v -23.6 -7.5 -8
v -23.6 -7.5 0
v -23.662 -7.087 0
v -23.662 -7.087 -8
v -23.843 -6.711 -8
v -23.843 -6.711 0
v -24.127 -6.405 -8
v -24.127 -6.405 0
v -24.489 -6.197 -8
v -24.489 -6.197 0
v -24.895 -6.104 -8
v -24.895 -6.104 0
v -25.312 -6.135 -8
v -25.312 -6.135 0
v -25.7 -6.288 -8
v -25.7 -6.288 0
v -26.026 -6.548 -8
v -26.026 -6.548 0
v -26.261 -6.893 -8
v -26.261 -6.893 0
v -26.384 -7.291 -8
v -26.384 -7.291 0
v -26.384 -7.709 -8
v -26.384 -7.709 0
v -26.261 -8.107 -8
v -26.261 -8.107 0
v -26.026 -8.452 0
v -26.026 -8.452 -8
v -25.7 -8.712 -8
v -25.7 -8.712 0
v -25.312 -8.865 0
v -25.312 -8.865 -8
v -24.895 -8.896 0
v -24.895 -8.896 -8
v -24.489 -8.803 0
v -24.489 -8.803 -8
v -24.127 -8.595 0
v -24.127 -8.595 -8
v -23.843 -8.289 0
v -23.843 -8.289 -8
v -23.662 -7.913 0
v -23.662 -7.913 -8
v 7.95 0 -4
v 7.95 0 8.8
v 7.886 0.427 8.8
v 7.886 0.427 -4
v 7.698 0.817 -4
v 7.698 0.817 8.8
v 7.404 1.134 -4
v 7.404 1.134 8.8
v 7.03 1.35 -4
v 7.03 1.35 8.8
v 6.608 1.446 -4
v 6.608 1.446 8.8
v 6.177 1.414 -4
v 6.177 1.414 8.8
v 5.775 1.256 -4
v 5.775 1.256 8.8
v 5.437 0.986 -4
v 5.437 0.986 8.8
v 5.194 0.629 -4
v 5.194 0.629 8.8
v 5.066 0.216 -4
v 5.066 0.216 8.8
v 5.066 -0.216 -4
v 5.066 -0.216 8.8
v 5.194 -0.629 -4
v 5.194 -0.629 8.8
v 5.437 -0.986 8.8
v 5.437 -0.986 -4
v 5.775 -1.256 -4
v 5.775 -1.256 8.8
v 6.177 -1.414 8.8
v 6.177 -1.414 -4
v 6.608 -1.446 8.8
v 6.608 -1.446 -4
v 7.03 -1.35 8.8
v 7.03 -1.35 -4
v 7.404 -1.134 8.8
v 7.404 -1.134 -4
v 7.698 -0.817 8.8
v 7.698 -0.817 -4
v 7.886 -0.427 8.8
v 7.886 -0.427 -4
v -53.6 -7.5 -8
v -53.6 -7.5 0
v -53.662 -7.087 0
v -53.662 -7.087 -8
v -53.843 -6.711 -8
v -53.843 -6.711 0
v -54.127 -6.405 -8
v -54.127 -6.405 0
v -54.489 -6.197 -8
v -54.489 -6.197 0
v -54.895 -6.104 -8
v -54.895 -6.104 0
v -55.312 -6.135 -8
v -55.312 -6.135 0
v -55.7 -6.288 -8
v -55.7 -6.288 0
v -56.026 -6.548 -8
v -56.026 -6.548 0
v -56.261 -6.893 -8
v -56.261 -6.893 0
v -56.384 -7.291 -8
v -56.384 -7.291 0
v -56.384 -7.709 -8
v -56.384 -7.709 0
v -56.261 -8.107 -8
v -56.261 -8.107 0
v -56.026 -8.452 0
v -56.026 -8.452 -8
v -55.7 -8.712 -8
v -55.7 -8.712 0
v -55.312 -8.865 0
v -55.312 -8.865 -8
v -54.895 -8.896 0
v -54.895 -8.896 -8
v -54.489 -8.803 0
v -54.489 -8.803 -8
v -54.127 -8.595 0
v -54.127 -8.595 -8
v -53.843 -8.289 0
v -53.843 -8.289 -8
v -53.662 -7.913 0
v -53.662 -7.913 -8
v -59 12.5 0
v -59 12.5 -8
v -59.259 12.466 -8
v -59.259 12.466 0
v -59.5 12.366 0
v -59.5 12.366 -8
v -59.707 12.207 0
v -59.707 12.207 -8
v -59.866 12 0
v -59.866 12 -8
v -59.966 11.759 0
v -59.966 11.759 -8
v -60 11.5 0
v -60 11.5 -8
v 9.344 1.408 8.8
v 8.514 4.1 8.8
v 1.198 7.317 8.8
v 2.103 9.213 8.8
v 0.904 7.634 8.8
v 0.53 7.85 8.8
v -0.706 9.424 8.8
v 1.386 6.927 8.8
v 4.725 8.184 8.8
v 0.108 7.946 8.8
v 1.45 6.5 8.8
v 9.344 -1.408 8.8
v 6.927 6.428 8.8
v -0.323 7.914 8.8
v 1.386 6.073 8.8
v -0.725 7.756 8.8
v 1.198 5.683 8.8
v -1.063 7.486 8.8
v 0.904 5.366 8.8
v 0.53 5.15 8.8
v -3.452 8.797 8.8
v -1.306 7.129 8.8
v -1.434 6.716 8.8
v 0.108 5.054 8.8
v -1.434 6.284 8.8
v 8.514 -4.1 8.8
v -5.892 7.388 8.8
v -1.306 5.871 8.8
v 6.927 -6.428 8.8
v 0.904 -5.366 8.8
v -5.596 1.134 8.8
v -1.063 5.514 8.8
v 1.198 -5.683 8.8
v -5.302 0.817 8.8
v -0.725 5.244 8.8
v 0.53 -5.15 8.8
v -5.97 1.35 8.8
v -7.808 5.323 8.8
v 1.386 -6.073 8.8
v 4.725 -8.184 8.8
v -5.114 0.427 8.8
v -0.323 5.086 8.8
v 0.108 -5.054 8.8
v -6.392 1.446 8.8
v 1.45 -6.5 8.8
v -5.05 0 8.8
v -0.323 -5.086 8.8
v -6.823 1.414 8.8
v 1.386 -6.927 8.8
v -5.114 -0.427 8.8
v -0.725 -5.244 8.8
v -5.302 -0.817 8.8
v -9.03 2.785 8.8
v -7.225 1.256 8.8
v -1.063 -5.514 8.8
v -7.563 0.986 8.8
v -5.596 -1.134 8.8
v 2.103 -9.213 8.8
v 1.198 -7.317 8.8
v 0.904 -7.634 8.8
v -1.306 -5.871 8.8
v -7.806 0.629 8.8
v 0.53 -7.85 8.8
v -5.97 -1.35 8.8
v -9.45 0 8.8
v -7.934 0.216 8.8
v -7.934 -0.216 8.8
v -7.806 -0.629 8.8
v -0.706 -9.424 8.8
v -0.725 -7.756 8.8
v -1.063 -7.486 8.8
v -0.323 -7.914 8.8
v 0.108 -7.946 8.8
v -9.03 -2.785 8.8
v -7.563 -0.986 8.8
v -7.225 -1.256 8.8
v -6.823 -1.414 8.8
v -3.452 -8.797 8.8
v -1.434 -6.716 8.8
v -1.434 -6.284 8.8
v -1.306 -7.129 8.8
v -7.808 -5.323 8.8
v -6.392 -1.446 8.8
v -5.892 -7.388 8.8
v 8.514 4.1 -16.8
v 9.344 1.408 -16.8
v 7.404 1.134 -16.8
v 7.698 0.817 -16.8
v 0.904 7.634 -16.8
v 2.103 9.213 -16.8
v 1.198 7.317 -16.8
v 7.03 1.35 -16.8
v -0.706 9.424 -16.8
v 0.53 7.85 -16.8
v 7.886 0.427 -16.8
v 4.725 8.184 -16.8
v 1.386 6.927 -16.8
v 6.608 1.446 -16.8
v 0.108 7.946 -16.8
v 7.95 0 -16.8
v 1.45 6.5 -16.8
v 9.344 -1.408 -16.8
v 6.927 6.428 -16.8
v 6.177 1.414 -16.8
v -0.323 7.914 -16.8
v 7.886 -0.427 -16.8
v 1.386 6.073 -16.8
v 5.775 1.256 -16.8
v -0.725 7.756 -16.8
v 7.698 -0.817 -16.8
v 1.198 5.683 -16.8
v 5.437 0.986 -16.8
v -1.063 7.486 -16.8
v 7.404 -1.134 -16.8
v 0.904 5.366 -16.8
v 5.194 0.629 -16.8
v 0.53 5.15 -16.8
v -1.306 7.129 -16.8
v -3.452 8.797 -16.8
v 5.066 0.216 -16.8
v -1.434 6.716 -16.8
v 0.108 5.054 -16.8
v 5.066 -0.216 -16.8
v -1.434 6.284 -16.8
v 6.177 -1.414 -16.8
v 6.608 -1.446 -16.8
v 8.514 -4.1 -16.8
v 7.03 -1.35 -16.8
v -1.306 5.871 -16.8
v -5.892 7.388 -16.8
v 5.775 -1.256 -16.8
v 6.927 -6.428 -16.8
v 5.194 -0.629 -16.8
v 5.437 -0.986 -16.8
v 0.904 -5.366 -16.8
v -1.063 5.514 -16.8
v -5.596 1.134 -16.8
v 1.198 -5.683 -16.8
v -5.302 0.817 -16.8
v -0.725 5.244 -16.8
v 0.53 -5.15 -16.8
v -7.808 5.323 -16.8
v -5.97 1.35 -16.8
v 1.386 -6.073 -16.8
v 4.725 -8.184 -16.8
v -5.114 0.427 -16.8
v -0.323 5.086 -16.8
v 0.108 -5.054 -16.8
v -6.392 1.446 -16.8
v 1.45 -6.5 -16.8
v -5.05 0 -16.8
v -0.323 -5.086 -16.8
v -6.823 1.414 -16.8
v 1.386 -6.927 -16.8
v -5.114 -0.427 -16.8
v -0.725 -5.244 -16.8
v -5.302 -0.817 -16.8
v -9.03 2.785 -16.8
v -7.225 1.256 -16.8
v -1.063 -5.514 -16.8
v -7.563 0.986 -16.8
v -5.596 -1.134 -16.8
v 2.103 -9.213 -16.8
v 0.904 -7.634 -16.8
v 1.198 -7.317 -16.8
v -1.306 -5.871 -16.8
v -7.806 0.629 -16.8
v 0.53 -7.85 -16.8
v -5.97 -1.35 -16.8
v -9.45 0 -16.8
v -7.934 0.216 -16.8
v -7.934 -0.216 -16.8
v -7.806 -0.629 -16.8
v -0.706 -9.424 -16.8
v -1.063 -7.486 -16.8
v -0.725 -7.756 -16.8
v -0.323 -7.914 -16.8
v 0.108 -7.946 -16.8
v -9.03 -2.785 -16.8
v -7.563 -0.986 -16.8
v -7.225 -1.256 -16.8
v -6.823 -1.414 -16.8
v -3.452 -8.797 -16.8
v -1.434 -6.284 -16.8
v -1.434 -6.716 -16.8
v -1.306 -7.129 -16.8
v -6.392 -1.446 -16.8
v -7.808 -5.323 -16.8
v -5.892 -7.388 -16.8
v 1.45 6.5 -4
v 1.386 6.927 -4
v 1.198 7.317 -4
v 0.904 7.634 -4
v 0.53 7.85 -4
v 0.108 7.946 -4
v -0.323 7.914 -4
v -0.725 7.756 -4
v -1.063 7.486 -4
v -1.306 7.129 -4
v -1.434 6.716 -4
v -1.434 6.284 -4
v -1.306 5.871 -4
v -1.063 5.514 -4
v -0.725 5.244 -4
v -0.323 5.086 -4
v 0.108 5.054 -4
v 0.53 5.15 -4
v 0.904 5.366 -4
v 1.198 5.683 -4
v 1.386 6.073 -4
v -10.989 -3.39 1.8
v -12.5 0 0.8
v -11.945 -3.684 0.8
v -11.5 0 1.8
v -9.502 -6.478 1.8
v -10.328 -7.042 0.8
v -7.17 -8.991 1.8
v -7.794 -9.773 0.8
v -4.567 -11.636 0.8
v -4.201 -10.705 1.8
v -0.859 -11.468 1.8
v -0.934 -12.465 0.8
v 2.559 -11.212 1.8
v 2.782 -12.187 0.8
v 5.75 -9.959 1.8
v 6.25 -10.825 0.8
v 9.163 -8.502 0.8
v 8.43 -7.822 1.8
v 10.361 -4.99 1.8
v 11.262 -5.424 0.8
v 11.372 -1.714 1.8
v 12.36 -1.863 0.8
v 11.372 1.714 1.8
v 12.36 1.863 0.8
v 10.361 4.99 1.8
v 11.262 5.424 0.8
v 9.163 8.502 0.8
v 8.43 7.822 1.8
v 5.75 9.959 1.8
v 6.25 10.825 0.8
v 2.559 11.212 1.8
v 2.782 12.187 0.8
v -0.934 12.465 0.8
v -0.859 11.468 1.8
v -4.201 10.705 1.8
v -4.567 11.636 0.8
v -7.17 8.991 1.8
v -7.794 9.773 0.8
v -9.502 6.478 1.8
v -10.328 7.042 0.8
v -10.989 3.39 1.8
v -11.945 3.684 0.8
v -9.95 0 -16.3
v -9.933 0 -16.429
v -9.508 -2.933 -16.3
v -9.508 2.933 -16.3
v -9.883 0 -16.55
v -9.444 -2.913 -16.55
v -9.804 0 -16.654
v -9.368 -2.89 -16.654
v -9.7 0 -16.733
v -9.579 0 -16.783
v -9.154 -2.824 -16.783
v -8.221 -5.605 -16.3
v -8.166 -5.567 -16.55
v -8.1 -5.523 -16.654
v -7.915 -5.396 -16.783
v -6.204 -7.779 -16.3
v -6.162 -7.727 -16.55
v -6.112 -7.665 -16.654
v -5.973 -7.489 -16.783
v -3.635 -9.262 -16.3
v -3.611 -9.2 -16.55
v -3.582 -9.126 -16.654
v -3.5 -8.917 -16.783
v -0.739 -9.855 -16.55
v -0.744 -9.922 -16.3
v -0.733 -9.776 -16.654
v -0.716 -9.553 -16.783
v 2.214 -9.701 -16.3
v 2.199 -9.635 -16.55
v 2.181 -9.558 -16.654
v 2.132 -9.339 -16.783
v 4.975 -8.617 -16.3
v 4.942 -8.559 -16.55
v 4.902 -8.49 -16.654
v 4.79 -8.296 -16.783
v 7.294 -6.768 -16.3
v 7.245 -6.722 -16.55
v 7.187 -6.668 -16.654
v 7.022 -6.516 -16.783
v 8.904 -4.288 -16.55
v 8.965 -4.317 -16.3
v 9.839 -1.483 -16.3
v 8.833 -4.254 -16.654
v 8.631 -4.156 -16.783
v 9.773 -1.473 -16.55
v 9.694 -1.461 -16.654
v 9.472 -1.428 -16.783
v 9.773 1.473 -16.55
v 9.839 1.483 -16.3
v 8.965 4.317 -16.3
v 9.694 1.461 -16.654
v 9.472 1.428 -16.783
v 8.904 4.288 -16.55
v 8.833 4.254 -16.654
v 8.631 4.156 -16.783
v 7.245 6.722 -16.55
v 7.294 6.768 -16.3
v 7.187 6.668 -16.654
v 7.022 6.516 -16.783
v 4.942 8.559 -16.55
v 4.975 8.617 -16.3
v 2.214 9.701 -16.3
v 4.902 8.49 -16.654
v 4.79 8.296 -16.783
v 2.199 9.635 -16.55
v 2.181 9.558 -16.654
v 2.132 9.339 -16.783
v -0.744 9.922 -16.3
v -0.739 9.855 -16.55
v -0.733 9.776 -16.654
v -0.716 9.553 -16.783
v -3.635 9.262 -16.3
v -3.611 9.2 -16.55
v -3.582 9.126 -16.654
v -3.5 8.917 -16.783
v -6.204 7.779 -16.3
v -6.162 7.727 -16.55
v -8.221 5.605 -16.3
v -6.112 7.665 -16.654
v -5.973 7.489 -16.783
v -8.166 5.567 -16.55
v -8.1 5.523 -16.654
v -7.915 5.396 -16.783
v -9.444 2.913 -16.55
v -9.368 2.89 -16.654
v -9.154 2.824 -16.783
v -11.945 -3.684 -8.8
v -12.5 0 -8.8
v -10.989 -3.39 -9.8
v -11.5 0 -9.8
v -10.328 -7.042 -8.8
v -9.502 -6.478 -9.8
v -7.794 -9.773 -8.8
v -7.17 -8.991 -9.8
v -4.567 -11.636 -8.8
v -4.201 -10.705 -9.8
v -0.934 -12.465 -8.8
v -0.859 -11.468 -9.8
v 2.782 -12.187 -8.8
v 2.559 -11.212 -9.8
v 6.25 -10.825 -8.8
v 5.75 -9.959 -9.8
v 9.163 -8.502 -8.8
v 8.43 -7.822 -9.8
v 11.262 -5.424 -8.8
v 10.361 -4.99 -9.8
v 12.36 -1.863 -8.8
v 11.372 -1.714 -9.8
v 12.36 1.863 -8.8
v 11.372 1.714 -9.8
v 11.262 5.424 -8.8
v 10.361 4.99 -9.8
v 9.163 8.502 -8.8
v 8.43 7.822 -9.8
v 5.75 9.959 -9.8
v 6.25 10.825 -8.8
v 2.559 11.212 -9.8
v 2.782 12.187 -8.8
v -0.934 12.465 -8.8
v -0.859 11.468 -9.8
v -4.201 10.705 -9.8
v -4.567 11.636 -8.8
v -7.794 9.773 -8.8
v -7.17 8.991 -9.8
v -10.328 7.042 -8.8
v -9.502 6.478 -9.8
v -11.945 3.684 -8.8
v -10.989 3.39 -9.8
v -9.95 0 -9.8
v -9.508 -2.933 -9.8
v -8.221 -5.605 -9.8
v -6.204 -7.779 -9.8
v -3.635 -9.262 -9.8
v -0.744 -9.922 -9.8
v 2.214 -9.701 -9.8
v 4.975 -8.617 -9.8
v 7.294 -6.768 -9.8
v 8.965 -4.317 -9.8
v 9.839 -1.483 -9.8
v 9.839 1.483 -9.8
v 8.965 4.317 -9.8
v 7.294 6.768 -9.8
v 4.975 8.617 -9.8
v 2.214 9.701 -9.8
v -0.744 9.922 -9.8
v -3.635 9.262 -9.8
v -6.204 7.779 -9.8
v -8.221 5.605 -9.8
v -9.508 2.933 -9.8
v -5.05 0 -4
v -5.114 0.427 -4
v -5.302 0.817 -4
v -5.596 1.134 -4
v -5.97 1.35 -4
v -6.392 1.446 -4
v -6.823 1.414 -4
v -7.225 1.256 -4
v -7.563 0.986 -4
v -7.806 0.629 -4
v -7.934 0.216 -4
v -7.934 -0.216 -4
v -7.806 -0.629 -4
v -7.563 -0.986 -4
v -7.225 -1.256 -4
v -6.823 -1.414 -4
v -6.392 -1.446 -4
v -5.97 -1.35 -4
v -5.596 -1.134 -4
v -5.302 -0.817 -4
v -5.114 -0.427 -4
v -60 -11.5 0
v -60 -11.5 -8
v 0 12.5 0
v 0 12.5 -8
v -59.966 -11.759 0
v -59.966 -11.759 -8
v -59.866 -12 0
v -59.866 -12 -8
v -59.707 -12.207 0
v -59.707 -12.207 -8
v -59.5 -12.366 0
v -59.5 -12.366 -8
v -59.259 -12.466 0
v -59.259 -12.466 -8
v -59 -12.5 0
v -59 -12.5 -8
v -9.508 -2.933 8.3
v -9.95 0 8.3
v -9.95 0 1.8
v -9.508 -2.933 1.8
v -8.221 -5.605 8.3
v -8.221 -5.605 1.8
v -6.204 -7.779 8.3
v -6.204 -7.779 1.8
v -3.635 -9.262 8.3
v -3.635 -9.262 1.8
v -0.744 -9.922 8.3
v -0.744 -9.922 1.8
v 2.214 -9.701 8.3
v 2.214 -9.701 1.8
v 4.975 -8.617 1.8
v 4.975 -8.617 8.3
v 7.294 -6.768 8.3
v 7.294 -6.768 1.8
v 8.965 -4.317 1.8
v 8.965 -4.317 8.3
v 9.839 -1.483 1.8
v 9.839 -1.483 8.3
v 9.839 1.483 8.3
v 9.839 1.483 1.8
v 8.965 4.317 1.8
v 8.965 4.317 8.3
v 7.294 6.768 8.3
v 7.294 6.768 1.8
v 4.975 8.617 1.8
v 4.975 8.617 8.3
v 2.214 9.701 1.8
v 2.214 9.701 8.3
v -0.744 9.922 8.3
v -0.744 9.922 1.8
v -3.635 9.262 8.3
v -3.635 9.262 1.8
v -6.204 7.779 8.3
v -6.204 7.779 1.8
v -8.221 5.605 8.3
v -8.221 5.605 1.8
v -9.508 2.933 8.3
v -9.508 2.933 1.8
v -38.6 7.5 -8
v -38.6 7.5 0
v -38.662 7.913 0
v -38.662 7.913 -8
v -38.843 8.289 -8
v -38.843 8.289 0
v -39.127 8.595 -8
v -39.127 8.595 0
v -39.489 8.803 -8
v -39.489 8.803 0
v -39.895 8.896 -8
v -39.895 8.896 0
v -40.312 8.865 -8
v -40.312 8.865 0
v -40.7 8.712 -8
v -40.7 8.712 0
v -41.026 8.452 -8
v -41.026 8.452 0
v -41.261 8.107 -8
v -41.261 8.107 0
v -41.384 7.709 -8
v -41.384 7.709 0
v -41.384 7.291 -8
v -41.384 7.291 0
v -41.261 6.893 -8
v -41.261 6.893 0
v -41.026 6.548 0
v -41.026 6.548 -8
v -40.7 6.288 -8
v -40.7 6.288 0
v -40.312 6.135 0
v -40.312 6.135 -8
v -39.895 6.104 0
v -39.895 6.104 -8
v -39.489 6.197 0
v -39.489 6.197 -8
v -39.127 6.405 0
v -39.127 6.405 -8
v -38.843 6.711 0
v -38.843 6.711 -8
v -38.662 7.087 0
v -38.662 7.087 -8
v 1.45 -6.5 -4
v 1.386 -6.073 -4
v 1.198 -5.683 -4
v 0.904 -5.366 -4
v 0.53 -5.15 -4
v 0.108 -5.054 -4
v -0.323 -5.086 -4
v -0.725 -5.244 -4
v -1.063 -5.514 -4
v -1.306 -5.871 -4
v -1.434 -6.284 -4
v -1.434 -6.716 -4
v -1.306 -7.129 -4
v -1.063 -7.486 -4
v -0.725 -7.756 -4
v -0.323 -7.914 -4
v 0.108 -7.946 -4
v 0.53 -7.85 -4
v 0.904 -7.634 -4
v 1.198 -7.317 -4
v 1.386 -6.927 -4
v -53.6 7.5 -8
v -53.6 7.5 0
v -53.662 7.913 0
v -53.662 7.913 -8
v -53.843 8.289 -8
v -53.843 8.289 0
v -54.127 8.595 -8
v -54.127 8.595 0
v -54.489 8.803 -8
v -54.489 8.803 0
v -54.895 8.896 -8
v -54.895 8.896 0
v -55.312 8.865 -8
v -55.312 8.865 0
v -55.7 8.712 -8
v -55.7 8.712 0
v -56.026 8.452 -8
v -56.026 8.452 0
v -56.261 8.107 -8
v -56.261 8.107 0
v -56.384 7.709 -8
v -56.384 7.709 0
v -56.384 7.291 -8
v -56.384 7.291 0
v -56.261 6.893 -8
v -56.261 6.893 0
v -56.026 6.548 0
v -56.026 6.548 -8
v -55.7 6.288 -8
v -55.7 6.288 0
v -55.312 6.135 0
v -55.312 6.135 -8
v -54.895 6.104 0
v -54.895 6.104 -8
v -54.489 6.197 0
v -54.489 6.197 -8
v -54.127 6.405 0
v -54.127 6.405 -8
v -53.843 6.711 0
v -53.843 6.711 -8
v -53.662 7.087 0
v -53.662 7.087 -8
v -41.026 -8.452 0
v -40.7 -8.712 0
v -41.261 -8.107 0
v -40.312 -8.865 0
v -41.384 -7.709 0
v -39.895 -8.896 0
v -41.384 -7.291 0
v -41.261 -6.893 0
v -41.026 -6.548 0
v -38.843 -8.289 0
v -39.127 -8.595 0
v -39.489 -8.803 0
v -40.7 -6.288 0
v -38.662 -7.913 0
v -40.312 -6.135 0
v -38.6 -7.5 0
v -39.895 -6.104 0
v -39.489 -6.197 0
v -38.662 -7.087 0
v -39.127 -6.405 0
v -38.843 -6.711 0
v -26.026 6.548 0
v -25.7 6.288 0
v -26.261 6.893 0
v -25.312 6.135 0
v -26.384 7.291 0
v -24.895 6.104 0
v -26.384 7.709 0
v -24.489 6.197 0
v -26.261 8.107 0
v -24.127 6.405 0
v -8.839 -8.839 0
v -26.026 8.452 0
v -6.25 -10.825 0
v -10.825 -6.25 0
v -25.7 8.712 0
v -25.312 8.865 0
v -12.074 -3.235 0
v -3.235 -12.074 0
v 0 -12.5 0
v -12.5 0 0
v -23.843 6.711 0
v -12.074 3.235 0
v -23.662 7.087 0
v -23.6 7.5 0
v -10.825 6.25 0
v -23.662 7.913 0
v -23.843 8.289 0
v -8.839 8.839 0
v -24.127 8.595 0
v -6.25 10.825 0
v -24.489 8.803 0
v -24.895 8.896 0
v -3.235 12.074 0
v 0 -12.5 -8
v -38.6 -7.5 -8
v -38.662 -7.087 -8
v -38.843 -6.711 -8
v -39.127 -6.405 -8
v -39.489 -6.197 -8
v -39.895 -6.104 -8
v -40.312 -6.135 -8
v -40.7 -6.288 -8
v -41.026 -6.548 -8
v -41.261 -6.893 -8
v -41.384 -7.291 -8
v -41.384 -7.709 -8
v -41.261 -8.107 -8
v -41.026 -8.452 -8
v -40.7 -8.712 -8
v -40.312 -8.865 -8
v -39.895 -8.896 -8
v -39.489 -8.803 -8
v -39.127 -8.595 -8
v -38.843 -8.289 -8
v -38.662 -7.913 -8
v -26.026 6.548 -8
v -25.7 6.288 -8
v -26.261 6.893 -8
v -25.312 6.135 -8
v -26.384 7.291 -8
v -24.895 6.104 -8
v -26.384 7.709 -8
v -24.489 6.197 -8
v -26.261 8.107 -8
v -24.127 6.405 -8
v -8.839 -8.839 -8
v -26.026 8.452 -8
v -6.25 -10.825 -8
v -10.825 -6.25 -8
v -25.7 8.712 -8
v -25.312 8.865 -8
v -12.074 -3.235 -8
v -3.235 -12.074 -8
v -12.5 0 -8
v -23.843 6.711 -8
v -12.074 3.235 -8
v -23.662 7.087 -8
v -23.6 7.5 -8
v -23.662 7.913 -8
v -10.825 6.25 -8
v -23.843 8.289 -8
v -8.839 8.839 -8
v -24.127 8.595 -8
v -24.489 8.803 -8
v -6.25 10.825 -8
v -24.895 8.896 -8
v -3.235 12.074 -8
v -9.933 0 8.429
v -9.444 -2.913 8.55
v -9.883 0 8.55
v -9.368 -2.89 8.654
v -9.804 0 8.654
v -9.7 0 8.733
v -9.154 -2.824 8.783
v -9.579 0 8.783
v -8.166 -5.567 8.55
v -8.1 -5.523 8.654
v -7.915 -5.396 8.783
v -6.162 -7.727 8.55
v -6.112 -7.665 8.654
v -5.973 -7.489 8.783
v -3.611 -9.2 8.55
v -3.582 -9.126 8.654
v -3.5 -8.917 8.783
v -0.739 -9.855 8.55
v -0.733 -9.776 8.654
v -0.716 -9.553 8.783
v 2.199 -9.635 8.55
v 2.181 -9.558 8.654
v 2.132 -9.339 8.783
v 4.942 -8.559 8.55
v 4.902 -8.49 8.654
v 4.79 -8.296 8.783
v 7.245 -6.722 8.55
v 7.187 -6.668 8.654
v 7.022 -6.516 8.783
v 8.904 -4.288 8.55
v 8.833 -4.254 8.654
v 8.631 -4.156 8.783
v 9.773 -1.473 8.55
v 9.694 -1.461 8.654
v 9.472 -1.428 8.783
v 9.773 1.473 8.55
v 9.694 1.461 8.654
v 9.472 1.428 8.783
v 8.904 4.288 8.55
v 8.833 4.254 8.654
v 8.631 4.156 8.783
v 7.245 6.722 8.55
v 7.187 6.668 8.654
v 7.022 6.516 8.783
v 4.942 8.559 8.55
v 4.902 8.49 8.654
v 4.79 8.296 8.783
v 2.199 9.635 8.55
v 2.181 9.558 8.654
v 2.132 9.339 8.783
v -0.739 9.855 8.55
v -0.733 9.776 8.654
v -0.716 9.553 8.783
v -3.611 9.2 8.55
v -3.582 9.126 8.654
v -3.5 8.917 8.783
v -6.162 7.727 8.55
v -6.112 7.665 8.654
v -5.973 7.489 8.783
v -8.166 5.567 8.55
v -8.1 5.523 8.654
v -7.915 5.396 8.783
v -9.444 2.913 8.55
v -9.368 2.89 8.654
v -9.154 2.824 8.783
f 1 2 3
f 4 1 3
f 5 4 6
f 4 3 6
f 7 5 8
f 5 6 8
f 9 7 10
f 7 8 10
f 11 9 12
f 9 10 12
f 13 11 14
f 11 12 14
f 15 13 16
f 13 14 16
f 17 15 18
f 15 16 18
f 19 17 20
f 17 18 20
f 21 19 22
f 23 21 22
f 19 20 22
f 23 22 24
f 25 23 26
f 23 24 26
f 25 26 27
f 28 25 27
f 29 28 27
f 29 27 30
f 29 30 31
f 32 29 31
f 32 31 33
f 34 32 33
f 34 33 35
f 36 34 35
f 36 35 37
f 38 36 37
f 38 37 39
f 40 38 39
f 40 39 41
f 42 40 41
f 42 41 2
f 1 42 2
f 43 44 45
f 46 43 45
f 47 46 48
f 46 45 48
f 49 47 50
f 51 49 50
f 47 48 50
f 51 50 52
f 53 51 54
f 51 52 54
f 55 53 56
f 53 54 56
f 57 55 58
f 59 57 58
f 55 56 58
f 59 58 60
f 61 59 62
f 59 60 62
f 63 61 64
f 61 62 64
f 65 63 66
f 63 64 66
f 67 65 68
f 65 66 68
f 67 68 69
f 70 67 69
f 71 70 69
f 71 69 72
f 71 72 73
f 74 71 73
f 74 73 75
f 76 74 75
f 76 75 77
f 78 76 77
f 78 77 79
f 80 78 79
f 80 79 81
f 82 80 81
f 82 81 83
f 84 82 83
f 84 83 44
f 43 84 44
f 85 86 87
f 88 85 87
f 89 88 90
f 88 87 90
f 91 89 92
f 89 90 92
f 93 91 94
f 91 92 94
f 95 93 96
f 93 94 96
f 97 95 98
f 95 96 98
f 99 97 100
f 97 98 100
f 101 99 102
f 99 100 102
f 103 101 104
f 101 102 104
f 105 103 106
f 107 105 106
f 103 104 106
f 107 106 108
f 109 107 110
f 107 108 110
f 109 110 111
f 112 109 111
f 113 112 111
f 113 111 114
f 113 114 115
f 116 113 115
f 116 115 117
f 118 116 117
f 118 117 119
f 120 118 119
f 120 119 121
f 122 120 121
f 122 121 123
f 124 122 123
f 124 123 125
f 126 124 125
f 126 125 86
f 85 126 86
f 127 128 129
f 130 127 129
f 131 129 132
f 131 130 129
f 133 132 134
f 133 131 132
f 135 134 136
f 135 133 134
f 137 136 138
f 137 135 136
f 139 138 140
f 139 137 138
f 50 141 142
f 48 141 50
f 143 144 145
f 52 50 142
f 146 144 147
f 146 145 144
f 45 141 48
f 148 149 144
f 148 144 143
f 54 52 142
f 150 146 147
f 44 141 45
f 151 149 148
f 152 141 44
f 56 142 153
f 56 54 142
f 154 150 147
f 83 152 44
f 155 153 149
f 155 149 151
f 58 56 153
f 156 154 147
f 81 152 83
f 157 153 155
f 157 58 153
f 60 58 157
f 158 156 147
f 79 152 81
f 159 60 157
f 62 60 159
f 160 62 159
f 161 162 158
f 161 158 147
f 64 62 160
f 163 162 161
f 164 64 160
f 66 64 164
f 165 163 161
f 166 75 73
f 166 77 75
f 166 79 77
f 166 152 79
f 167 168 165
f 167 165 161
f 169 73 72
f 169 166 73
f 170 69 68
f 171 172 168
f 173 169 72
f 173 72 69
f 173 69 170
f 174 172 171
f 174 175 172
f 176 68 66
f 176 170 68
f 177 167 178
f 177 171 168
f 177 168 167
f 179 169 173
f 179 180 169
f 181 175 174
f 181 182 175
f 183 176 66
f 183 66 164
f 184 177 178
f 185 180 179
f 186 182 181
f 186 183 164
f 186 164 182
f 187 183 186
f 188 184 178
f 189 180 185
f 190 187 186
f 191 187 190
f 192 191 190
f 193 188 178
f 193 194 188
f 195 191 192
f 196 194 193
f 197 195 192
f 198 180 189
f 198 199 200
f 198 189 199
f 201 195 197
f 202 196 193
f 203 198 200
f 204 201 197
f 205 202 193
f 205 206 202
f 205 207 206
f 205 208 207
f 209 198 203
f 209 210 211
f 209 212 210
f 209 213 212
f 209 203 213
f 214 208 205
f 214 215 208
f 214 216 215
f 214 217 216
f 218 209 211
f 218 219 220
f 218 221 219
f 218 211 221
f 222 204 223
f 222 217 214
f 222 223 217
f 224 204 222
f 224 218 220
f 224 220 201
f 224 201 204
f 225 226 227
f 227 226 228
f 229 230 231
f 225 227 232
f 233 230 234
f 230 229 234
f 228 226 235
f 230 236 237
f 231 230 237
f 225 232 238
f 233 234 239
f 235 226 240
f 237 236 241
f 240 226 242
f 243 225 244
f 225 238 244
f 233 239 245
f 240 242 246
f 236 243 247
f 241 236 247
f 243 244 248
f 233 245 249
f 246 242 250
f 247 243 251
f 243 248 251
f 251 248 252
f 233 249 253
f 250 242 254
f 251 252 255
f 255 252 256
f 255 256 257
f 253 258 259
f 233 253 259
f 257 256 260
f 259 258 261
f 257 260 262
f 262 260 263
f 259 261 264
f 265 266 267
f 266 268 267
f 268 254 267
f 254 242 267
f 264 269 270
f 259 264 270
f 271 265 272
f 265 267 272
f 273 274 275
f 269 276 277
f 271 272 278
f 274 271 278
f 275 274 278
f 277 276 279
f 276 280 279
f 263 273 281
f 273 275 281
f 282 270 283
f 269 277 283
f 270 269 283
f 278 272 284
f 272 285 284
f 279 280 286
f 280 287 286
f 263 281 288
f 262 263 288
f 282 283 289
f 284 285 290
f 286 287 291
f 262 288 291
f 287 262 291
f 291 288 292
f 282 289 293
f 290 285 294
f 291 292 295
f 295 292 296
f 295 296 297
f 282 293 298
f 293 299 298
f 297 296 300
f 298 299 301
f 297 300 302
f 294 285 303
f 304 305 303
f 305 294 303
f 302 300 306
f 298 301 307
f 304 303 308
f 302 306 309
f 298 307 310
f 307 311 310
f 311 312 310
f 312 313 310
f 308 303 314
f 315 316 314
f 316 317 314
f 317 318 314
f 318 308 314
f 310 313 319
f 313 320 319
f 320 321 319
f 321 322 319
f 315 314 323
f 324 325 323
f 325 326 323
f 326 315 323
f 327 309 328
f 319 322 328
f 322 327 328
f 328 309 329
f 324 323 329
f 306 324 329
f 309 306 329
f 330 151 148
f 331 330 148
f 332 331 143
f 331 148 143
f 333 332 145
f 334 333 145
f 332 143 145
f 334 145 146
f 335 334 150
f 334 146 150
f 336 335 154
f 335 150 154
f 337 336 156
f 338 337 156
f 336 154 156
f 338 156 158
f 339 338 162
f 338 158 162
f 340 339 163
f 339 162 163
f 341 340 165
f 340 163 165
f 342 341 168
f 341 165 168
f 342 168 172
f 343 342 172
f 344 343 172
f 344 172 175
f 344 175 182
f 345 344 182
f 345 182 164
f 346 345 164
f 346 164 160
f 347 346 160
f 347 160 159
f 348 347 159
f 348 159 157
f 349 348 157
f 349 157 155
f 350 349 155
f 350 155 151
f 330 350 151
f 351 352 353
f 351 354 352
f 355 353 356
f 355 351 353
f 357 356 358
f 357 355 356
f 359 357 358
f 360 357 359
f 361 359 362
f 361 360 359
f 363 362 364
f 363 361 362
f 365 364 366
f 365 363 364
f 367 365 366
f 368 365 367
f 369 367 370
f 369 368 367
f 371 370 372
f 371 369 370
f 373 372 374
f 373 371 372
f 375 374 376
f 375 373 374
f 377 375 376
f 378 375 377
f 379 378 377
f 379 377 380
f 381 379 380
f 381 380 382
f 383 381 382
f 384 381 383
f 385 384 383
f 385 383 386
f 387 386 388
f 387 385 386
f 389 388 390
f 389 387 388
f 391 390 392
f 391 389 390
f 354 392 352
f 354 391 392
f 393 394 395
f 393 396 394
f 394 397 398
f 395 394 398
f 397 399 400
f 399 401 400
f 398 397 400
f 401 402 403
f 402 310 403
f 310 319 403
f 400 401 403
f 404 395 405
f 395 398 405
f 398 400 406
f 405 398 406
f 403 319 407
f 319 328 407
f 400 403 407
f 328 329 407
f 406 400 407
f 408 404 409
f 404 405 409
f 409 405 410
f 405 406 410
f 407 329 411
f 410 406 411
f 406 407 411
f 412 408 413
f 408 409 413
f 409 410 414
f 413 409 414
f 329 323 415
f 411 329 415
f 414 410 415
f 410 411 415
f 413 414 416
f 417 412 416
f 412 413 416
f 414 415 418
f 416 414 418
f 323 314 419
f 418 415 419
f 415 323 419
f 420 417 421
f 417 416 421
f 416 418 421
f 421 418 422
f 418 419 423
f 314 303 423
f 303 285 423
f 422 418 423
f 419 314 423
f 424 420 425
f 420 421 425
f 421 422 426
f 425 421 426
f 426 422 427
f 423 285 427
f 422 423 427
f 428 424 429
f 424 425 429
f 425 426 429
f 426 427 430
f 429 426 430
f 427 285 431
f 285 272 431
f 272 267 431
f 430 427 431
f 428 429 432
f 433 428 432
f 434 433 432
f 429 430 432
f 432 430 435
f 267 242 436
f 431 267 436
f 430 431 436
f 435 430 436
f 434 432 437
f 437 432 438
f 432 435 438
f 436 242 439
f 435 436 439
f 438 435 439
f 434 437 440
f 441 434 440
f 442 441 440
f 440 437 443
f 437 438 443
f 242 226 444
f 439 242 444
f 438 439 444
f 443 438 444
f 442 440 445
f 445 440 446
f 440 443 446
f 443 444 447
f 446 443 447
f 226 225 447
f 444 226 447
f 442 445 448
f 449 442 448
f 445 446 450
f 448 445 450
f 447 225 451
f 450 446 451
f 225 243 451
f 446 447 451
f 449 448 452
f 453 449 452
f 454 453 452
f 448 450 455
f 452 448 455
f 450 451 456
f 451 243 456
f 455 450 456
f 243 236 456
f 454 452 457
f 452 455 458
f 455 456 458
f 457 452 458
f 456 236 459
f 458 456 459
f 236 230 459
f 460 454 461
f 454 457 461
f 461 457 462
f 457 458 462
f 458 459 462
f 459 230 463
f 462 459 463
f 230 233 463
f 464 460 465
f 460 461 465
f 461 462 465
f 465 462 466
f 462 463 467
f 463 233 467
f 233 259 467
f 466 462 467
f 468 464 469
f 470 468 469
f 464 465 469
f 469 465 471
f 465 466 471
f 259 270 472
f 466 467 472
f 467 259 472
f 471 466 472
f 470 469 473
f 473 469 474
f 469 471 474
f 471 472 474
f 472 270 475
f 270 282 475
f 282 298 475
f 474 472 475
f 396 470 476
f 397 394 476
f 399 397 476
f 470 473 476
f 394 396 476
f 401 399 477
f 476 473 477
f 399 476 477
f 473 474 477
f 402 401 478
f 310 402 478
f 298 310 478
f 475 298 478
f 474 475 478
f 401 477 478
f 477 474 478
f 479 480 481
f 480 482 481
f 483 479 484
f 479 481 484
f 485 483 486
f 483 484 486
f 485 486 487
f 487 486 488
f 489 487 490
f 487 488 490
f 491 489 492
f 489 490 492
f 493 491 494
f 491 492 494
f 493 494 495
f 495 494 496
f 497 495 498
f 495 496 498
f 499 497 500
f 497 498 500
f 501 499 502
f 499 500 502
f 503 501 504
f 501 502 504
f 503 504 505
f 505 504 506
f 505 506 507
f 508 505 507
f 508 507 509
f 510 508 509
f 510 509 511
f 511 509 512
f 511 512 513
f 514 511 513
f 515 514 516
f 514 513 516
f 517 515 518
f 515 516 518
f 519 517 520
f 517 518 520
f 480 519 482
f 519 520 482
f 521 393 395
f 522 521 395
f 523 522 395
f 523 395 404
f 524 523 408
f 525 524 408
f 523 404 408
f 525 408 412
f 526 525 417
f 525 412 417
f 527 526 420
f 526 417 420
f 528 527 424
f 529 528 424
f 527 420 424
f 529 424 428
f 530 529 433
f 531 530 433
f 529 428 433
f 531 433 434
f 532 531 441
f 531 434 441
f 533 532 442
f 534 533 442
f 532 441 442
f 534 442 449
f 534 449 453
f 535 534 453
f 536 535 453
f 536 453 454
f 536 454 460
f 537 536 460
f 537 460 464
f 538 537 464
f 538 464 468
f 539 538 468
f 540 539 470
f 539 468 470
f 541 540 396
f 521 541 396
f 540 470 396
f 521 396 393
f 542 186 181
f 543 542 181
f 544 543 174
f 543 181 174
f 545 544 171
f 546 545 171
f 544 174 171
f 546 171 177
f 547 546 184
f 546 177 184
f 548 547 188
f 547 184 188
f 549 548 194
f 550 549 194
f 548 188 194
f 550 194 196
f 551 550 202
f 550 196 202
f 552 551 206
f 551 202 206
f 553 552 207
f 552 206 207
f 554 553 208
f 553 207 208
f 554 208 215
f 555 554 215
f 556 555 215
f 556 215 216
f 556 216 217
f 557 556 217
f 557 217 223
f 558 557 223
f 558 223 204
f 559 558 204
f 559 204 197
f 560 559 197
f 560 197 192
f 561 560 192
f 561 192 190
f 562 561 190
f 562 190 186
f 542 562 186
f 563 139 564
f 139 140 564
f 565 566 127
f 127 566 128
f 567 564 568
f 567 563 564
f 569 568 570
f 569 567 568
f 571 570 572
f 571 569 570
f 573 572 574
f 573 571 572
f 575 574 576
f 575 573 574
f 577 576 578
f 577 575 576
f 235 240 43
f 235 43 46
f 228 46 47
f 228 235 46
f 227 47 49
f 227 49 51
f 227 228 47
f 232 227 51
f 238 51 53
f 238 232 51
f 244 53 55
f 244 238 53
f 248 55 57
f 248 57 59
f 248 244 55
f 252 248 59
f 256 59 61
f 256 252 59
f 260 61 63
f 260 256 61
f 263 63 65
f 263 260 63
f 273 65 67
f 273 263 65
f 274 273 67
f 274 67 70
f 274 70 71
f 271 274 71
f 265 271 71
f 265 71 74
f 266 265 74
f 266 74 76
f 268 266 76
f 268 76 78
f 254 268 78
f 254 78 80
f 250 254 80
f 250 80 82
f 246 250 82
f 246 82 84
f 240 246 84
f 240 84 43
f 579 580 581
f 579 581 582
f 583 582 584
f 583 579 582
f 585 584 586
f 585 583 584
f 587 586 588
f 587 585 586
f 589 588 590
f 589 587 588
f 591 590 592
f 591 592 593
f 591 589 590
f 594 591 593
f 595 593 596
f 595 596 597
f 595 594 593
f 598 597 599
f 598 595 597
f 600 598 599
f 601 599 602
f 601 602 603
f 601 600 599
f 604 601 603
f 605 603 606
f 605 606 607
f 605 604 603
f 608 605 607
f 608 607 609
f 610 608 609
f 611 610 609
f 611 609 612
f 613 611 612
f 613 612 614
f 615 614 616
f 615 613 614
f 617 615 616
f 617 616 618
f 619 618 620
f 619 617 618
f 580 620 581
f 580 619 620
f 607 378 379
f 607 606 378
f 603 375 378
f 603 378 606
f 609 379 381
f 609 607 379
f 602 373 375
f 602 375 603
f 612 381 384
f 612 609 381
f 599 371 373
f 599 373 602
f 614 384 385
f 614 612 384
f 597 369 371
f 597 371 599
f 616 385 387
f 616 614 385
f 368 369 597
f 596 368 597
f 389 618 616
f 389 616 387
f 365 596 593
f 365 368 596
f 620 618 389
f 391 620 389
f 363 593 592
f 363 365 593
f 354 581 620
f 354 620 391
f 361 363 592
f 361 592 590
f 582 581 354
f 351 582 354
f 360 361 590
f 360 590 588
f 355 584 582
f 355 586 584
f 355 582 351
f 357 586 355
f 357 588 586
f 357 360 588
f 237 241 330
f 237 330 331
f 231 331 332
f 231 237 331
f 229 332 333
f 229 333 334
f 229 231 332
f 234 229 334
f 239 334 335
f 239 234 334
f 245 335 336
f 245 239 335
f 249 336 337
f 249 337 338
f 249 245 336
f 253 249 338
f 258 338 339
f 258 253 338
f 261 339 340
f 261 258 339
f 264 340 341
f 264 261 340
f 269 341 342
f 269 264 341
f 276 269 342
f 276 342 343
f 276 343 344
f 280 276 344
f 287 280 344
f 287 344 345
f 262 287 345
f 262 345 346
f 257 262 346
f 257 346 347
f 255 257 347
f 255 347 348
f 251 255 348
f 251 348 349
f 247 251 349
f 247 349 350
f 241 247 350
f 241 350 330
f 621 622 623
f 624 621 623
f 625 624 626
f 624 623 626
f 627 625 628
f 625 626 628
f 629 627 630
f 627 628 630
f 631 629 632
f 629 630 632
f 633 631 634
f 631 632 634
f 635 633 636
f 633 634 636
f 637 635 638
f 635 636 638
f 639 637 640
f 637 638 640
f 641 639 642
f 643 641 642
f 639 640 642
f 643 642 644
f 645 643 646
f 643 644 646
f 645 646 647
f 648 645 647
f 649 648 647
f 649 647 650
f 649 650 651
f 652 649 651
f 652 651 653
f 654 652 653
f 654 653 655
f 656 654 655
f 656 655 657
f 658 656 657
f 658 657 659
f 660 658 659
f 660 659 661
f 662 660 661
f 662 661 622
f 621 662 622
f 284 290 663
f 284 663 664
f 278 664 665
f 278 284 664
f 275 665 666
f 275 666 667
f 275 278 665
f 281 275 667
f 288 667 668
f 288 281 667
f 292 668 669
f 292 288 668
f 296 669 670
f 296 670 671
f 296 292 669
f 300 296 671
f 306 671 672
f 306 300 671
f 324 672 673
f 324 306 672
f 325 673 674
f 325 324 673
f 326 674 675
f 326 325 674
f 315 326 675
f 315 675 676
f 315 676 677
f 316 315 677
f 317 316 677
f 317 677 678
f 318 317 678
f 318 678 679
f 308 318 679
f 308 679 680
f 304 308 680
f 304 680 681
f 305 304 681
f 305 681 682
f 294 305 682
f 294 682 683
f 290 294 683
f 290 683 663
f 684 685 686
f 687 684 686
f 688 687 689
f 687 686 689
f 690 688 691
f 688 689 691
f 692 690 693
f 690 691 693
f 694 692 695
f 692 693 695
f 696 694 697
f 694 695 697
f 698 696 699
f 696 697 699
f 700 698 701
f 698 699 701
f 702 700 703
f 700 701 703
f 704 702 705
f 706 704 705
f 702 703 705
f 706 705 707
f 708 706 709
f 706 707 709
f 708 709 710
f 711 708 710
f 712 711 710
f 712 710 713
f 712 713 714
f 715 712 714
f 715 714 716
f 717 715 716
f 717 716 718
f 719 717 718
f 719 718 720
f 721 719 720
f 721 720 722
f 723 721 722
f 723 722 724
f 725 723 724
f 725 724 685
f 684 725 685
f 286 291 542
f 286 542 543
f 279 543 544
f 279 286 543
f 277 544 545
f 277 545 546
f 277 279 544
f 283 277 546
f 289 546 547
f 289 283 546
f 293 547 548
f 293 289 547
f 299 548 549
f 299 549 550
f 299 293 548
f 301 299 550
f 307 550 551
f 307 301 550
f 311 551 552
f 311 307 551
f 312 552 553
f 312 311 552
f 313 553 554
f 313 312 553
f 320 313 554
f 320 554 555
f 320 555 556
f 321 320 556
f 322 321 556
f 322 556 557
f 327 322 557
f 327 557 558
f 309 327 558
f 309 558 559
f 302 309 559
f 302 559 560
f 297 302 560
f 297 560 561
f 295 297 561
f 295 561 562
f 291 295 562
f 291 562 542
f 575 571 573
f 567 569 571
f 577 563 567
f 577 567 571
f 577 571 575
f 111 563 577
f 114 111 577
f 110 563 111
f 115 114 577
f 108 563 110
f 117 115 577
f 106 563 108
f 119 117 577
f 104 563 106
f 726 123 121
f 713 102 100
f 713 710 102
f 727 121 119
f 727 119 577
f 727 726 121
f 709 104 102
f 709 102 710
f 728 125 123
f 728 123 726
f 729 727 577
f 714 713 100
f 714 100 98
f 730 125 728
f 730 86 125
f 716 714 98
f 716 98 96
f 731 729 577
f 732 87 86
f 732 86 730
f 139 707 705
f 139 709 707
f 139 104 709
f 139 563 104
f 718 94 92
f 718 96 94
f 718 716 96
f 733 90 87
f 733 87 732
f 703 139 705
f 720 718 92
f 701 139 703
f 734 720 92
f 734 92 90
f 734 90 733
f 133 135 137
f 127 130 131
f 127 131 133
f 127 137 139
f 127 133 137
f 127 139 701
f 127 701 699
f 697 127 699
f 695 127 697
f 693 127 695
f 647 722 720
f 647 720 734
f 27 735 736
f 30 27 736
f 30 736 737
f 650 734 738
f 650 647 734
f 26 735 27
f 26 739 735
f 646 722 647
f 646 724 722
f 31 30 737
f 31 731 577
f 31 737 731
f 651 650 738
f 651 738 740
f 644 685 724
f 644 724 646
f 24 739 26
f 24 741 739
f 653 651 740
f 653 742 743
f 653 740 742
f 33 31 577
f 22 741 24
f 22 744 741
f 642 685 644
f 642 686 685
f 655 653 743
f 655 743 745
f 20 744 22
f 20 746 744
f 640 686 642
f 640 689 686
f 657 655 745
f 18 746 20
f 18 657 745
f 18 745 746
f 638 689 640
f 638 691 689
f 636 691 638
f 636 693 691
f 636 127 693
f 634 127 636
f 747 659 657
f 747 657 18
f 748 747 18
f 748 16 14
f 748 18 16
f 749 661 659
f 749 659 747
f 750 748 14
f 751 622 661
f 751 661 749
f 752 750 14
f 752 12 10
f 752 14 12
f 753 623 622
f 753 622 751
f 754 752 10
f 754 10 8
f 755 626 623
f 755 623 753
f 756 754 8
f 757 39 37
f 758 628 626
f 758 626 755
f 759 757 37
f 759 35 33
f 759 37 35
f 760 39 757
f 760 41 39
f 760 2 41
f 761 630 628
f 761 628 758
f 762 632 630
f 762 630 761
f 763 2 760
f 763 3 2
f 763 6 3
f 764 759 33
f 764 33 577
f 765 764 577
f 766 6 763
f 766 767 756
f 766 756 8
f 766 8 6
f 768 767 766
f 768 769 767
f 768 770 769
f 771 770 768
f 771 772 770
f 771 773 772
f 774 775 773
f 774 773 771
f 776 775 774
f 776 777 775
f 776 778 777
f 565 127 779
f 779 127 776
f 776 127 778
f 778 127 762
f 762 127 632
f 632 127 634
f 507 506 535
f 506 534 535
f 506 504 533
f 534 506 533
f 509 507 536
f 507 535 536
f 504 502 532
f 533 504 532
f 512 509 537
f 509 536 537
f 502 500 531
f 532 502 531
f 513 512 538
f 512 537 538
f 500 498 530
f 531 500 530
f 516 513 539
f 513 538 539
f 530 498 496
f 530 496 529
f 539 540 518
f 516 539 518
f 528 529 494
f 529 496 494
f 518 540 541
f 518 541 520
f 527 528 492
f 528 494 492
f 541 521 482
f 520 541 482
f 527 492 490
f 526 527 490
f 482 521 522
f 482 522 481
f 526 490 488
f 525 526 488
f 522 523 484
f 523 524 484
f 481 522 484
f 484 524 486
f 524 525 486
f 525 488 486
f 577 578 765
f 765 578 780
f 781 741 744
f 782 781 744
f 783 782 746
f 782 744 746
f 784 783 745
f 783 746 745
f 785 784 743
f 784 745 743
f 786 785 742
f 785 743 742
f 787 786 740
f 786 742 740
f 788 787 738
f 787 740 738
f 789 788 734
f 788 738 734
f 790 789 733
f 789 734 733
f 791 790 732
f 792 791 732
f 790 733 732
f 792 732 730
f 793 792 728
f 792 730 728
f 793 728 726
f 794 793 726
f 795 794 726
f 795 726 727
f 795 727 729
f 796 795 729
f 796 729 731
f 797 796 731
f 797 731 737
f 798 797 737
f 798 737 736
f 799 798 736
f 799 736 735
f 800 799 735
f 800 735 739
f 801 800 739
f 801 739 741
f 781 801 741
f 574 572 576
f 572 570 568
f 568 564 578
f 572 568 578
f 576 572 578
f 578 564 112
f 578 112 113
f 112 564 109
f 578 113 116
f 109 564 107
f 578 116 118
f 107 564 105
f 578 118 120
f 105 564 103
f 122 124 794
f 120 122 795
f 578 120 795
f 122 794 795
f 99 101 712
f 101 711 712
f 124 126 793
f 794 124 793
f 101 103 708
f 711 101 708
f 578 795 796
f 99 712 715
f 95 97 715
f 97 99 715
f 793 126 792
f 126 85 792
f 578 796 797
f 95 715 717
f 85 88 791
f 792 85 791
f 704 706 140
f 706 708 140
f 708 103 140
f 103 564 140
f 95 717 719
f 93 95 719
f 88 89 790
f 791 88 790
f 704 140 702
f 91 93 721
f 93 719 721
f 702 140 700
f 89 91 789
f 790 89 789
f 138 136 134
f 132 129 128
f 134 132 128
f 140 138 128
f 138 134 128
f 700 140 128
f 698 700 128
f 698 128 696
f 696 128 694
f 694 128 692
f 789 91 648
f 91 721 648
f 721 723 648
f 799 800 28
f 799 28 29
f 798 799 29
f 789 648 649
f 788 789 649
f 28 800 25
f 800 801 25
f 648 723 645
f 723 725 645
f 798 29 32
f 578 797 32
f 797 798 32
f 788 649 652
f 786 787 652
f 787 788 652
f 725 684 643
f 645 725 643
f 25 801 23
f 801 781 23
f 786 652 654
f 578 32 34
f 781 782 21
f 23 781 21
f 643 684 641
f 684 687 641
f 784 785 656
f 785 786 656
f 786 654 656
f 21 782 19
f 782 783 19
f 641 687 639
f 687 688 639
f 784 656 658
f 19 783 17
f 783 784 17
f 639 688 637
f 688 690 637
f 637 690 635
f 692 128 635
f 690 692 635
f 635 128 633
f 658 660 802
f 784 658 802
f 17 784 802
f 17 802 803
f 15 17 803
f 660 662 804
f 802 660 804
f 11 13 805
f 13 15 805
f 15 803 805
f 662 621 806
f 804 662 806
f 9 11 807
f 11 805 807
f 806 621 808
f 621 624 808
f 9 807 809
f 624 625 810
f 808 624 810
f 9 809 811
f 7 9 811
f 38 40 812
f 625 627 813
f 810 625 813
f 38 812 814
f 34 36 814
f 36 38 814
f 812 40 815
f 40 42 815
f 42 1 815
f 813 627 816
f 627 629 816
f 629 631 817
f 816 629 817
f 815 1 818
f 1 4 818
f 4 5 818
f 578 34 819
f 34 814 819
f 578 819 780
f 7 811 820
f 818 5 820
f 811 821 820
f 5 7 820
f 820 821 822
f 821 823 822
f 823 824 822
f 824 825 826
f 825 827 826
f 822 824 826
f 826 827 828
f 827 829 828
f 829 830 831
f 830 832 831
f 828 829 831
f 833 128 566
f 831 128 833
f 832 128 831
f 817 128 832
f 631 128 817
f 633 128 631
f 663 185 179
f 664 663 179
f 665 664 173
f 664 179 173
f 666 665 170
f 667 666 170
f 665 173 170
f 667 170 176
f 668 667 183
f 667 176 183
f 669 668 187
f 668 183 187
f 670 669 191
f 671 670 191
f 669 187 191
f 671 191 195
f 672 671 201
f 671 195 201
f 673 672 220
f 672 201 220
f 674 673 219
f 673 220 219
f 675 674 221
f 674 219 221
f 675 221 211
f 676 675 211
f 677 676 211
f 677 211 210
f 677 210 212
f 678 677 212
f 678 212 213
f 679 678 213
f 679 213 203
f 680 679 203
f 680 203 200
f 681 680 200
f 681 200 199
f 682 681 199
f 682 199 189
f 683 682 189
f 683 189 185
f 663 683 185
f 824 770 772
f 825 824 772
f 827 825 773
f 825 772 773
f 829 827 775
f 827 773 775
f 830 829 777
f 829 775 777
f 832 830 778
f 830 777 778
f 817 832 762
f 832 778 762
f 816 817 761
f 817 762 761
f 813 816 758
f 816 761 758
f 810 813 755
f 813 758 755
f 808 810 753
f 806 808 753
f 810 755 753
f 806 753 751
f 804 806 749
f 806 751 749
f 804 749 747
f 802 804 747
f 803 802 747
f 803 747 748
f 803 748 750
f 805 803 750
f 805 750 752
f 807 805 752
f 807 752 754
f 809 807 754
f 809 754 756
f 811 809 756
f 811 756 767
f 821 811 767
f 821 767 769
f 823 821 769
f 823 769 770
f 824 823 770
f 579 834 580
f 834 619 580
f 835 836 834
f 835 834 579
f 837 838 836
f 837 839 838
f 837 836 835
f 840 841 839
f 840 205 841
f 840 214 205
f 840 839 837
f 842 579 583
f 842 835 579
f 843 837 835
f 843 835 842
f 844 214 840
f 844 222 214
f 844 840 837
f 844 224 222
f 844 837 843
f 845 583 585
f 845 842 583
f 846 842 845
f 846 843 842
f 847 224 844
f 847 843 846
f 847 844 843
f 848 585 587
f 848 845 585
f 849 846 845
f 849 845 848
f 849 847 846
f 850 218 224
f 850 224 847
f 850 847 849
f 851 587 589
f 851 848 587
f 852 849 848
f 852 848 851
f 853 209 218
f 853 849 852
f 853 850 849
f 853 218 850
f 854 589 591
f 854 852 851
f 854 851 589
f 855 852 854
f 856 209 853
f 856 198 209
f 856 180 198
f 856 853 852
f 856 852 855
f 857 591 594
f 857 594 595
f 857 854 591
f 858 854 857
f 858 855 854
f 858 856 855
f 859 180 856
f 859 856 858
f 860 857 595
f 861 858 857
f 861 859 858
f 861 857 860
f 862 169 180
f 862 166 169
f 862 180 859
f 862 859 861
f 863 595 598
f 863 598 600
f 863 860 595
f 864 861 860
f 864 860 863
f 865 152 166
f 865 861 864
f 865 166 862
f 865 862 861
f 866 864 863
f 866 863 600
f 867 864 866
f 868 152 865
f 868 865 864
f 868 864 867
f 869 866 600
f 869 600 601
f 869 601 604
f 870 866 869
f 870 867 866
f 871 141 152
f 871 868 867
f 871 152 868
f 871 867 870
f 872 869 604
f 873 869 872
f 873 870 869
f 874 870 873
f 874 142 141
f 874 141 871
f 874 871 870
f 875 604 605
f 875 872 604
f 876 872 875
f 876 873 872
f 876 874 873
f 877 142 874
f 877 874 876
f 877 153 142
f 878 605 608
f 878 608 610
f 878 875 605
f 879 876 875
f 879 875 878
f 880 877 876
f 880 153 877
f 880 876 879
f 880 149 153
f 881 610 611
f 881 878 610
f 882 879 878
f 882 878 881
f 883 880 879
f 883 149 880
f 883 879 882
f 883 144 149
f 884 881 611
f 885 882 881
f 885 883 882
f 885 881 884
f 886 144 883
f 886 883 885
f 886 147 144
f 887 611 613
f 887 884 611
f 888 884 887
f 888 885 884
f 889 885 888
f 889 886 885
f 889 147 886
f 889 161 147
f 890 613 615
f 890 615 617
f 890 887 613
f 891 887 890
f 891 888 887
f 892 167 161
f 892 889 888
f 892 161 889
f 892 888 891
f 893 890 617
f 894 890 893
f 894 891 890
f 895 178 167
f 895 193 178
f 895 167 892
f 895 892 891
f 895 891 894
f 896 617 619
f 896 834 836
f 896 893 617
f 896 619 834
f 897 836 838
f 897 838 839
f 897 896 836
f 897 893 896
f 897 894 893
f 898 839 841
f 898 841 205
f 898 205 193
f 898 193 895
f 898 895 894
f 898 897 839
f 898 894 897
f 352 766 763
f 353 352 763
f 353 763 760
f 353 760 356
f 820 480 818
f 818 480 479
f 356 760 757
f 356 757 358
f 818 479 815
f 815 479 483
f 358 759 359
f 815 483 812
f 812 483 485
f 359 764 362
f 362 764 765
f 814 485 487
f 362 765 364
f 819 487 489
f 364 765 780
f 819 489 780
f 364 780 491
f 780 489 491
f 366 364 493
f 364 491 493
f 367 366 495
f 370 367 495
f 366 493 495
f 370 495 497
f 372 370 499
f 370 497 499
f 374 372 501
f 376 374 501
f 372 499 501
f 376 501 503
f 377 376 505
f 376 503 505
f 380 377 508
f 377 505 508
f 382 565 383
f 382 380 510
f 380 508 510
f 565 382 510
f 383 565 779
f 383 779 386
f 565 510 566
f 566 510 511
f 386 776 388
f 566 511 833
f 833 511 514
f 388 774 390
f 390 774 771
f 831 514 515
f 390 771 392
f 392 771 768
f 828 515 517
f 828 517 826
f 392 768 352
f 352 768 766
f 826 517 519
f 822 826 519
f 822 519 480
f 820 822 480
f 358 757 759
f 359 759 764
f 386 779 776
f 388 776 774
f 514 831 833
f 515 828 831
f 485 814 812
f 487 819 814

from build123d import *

# Parameters (mm, degrees)
BOSS_EXTRUDE1_DEPTH = 4
SKETCH6_R           = 1.45
CUT_EXTRUDE1_DEPTH  = 63.610622102
SKETCH7_R           = 1.4
CUT_EXTRUDE2_DEPTH  = 64.549114864
FILLET1_R           = 1
FILLET2_R           = 0.5


with BuildPart() as part:
    # Sketch4 → Revolve1 (revolve)
    with BuildSketch(Plane(origin=(0, 0, 0), x_dir=(1, 0, 0), z_dir=(0, 1, 0)), mode=Mode.PRIVATE) as revolve1_sk:
        Polygon((9.95, -8.8), (0, -8.8), (0, 0), (12.5, 0), (12.5, -0.8), (11.5, -1.8), (9.95, -1.8), align=None)
    revolve1 = revolve(revolve1_sk.sketch.rotate(Axis((0, 0, 0), (0, 0, 1)), 180), axis=Axis((0, 0, 0), (0, 0, 1)))

    # Sketch5 → Boss-Extrude1 (add)
    with BuildSketch(Plane.XY):
        with BuildLine():
            Line((0, 12.5), (-60, 12.5))
            Line((-60, 12.5), (-60, -12.5))
            Line((-60, -12.5), (0, -12.5))
            ThreePointArc((0, -12.5), (12.5, 0), (0, 12.5))
        make_face()
    boss_extrude1 = extrude(amount=-BOSS_EXTRUDE1_DEPTH)

    # Sketch6 → Cut-Extrude1 (cut, through all)
    with BuildSketch(Plane.XY.offset(8.8)):
        with Locations((0, 6.5)):
            Circle(SKETCH6_R)
        with Locations((6.5, 0)):
            Circle(SKETCH6_R)
        with Locations((0, -6.5)):
            Circle(SKETCH6_R)
        with Locations((-6.5, 0)):
            Circle(SKETCH6_R)
    cut_extrude1 = extrude(amount=-CUT_EXTRUDE1_DEPTH, mode=Mode.SUBTRACT)

    # Mirror1: Revolve1, Boss-Extrude1, Cut-Extrude1 across plane
    add(revolve1.mirror(Plane.XY.offset(-4)))
    add(boss_extrude1.mirror(Plane.XY.offset(-4)))
    add(cut_extrude1.mirror(Plane.XY.offset(-4)), mode=Mode.SUBTRACT)

    # Sketch7 → Cut-Extrude2 (cut, through all)
    with BuildSketch(Plane.XY):
        with Locations((-55, 7.5)):
            Circle(SKETCH7_R)
        with Locations((-55, -7.5)):
            Circle(SKETCH7_R)
        with Locations((-40, 7.5)):
            Circle(SKETCH7_R)
        with Locations((-40, -7.5)):
            Circle(SKETCH7_R)
        with Locations((-25, 7.5)):
            Circle(SKETCH7_R)
        with Locations((-25, -7.5)):
            Circle(SKETCH7_R)
    extrude(amount=-CUT_EXTRUDE2_DEPTH, mode=Mode.SUBTRACT)

    # Fillet1
    fillet1_edges = [part.edges().sort_by_distance(p)[0] for p in [
        (-60, -12.5, -2),
        (-60, 12.5, -2),
    ]]
    fillet(fillet1_edges, radius=FILLET1_R)

    # Fillet2
    fillet2_edges = [part.edges().sort_by_distance(p)[0] for p in [
        (9.95, 0, -16.8),
        (9.95, 0, 8.8),
    ]]
    fillet(fillet2_edges, radius=FILLET2_R)


solid = part.part
